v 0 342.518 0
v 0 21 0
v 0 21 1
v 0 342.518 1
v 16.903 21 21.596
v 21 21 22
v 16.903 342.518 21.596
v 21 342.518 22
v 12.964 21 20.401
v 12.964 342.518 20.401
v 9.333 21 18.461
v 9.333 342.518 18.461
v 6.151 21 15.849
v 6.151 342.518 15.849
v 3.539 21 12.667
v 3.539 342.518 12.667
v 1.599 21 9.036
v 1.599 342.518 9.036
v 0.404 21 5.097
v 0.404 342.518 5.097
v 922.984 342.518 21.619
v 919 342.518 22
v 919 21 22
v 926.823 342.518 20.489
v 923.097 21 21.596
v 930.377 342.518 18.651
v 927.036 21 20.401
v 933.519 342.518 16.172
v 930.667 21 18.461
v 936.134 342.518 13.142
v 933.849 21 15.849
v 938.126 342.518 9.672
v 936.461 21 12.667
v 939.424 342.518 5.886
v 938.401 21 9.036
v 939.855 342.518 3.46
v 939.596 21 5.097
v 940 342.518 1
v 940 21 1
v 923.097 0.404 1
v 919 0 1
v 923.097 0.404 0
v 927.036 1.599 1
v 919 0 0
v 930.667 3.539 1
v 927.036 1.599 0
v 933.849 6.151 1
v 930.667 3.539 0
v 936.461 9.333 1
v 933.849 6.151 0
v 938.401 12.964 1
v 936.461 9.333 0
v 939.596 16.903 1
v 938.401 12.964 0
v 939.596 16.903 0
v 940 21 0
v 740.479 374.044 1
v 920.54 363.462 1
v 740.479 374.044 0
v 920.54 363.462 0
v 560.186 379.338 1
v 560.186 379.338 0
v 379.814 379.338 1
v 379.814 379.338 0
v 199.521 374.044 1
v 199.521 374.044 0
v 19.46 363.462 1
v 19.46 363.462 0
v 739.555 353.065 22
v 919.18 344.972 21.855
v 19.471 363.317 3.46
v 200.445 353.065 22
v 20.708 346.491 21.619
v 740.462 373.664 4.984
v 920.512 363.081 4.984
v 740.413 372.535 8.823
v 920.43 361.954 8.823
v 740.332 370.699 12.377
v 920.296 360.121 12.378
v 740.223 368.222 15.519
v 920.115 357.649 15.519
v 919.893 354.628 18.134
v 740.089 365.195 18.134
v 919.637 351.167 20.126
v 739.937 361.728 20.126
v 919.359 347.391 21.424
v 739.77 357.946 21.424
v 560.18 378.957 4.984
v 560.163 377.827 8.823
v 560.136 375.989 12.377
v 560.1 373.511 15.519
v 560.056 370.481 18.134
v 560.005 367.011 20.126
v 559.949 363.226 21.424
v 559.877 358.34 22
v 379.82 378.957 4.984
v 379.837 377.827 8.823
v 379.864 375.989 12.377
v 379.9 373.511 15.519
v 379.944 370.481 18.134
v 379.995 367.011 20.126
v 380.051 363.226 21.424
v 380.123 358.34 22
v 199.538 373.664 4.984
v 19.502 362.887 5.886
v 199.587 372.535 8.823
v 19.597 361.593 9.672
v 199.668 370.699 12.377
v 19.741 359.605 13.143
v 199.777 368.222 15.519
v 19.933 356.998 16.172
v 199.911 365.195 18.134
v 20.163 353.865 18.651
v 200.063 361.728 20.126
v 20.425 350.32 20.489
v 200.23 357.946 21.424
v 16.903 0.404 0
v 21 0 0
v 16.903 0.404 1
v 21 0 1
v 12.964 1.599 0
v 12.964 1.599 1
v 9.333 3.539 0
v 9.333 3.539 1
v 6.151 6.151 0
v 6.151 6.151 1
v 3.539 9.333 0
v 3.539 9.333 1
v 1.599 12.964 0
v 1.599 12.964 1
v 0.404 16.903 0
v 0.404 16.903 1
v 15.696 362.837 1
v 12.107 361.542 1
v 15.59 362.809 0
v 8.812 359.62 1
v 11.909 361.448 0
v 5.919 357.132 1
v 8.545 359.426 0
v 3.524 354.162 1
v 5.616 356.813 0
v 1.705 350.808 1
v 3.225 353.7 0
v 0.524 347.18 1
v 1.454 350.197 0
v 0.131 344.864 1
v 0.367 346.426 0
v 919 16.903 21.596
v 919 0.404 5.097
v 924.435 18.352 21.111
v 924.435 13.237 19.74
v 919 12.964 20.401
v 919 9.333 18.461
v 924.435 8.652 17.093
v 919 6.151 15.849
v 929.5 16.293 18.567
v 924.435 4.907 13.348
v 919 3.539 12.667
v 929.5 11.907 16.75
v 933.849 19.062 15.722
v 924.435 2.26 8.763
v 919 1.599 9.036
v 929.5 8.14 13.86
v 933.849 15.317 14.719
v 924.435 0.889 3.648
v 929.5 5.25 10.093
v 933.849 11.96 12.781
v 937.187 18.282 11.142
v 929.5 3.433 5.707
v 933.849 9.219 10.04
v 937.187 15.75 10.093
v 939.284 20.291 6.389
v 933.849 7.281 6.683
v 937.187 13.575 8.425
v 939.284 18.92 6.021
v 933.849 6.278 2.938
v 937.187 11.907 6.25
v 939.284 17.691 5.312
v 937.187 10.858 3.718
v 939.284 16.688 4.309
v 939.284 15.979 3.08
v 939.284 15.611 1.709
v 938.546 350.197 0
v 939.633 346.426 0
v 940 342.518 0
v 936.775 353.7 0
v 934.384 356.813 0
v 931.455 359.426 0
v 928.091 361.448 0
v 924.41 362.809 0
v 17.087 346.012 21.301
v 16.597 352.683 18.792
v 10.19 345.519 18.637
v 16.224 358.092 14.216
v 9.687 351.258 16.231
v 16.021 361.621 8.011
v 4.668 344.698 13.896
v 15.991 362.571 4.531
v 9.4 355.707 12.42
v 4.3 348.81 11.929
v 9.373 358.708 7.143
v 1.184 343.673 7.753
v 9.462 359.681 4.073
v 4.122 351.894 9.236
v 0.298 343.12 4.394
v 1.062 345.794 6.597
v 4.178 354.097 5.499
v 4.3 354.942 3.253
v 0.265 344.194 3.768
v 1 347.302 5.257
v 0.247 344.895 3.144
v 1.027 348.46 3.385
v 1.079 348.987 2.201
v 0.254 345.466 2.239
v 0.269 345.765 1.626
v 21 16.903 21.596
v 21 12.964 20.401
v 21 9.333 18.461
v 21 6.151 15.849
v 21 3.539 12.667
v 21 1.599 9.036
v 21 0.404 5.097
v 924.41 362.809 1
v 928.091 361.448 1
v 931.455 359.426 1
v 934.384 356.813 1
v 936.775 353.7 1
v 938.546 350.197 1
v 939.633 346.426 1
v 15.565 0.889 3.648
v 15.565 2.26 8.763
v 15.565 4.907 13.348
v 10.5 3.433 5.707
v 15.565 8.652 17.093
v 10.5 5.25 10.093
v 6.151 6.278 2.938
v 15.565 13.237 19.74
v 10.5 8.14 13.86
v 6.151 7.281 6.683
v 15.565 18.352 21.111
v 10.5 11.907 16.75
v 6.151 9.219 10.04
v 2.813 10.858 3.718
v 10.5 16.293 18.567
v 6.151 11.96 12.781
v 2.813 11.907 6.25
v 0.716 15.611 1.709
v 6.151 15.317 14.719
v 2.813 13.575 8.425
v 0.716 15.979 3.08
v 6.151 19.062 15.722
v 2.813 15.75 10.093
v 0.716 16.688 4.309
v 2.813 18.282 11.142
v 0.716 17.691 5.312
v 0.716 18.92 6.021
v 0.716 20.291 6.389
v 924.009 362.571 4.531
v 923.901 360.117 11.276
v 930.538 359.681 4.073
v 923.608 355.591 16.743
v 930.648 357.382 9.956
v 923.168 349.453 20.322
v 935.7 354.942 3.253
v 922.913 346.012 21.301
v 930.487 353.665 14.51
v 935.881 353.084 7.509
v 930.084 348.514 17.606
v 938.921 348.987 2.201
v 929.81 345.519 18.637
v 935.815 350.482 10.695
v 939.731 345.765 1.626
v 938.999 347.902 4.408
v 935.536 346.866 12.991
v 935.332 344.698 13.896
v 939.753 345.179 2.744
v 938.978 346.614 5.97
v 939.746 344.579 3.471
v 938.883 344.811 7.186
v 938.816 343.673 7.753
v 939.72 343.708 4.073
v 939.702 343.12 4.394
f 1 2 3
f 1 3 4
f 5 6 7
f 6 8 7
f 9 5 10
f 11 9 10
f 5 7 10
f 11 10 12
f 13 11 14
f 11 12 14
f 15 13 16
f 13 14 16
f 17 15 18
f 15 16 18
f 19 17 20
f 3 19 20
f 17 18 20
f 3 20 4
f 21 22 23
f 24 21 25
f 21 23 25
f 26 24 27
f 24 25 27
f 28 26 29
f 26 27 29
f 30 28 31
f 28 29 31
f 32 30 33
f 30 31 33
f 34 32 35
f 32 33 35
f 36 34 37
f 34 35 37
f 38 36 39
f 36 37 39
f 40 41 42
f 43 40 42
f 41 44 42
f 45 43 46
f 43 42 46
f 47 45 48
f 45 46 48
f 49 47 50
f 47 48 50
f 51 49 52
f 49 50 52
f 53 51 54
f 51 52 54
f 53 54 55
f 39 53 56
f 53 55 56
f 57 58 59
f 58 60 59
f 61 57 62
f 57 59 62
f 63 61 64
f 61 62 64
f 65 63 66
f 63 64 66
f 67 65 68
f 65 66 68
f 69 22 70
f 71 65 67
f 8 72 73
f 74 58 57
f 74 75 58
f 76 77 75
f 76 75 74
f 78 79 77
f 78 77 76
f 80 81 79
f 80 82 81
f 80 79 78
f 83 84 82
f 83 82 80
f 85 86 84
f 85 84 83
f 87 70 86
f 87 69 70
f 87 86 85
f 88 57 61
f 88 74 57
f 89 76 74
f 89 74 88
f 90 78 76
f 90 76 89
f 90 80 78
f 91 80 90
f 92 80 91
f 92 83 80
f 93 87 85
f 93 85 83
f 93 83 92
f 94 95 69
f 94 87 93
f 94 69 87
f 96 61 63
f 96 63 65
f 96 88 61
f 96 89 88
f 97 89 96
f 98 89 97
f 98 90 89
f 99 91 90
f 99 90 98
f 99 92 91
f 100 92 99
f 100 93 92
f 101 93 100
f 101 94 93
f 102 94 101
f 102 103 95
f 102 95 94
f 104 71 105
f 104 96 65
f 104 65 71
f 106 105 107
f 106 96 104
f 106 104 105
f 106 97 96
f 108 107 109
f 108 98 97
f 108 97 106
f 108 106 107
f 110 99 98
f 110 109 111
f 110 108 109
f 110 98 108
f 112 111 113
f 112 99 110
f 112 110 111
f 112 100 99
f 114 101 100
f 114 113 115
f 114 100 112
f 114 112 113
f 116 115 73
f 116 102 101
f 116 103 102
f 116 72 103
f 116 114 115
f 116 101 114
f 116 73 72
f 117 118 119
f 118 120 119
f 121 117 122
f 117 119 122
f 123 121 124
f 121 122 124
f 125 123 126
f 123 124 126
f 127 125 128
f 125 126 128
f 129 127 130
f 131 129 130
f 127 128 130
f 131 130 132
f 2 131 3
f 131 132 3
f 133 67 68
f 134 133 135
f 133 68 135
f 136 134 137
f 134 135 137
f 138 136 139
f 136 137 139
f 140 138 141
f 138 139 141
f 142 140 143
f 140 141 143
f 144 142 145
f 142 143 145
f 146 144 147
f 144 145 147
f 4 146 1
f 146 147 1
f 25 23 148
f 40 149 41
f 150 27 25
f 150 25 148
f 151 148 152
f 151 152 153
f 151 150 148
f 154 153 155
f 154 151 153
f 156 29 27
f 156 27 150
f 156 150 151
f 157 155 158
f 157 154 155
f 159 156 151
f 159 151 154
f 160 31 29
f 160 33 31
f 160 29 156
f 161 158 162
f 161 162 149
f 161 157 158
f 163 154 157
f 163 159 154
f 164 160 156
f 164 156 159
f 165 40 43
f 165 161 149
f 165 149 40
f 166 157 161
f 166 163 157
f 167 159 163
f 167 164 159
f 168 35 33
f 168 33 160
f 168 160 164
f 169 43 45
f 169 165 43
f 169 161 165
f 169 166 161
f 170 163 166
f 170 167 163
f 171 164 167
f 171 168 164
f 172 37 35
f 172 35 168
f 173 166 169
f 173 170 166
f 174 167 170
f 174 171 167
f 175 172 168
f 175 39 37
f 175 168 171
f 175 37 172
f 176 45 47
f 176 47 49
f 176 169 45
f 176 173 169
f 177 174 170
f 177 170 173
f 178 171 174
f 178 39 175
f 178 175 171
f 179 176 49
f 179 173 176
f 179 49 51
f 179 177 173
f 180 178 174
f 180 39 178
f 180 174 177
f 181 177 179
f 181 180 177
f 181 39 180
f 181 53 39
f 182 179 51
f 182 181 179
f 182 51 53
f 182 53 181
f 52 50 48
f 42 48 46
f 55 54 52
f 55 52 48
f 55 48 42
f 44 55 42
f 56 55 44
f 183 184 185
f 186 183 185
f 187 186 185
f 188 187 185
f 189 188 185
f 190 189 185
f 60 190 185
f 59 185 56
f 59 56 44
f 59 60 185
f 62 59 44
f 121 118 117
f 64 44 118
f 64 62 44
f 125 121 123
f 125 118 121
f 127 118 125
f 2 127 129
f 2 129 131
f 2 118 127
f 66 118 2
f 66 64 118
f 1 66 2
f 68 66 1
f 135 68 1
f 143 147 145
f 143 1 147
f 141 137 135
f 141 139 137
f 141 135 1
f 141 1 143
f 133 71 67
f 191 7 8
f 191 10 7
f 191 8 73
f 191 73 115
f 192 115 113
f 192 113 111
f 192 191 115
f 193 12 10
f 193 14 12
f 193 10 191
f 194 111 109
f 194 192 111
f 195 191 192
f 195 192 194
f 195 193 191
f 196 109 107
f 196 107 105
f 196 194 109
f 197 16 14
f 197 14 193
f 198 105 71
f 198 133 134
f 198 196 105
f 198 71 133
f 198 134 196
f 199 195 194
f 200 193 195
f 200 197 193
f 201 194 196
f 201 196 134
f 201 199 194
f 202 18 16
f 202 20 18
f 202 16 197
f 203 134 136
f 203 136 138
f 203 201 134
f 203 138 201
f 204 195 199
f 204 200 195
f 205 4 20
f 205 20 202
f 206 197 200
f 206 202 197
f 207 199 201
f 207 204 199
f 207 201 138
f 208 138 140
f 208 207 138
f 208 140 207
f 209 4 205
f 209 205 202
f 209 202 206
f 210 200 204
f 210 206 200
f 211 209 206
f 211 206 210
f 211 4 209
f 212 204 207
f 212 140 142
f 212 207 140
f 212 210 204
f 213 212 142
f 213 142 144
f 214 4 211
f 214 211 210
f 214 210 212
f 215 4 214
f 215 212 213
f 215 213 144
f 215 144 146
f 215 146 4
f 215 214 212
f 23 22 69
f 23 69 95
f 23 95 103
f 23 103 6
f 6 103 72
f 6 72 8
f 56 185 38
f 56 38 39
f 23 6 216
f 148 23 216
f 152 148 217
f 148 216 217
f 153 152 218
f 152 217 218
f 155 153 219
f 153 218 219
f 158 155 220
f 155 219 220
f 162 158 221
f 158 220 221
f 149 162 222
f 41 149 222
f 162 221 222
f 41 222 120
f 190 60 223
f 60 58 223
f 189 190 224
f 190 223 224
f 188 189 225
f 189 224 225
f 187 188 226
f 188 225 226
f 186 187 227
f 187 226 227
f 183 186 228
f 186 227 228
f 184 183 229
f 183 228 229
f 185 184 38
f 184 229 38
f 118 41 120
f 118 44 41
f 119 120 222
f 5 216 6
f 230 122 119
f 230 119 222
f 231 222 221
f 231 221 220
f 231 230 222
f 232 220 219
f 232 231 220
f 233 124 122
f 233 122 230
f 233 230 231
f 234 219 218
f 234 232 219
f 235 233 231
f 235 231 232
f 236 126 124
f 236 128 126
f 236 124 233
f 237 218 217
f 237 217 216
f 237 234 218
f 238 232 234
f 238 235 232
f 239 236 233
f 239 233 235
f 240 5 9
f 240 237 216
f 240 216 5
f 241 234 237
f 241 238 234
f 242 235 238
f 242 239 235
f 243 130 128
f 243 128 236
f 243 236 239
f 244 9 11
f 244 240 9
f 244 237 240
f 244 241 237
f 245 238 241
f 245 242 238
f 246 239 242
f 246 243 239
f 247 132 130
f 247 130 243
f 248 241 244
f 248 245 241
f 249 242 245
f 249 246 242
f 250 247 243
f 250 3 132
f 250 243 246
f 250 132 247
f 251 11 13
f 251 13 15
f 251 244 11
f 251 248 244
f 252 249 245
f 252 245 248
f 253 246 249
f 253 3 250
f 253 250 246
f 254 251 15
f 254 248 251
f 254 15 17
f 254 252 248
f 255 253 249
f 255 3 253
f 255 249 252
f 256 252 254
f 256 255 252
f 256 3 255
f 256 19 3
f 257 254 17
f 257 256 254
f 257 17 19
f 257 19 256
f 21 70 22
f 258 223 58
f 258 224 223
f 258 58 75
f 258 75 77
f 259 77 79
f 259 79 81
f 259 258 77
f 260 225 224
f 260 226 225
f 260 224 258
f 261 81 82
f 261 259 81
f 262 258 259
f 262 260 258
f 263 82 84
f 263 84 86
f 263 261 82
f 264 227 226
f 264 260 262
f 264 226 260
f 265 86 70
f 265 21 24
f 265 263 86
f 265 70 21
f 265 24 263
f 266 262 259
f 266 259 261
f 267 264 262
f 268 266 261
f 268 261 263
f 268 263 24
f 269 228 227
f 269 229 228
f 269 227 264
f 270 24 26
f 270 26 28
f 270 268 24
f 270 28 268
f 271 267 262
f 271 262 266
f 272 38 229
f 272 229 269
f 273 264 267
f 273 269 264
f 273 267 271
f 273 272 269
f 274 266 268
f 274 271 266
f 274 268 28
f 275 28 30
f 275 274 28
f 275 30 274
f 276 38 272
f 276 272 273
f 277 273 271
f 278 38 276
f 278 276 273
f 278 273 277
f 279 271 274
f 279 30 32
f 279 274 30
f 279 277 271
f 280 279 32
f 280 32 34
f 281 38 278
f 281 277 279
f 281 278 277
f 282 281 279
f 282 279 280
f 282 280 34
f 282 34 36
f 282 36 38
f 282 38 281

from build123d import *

# Parameters (mm, degrees)
PAD_DEPTH   = 22
FILLET_R    = 21
FILLET001_R = 21
FILLET002_R = 21
FILLET003_R = 21


with BuildPart() as part:
    # Sketch → Pad (new body)
    with BuildSketch(Plane.XY):
        with BuildLine():
            Line((940, 362), (940, 0))
            Line((940, 0), (0, 0))
            Line((0, 0), (0, 362))
            ThreePointArc((940, 362), (470, 380), (0, 362))
        make_face()
    extrude(amount=PAD_DEPTH)

    # Fillet
    fillet_edges = [part.edges().sort_by_distance(p)[0] for p in [
        (470, 380, 22),
    ]]
    fillet(fillet_edges, radius=FILLET_R)

    # Fillet001
    fillet001_edges = [part.edges().sort_by_distance(p)[0] for p in [
        (470, 0, 22),
    ]]
    fillet(fillet001_edges, radius=FILLET001_R)

    # Fillet002
    fillet002_edges = [part.edges().sort_by_distance(p)[0] for p in [
        (0, 180.969047, 22),
    ]]
    fillet(fillet002_edges, radius=FILLET002_R)

    # Fillet003
    fillet003_edges = [part.edges().sort_by_distance(p)[0] for p in [
        (940, 180.969047, 22),
    ]]
    fillet(fillet003_edges, radius=FILLET003_R)


solid = part.part
